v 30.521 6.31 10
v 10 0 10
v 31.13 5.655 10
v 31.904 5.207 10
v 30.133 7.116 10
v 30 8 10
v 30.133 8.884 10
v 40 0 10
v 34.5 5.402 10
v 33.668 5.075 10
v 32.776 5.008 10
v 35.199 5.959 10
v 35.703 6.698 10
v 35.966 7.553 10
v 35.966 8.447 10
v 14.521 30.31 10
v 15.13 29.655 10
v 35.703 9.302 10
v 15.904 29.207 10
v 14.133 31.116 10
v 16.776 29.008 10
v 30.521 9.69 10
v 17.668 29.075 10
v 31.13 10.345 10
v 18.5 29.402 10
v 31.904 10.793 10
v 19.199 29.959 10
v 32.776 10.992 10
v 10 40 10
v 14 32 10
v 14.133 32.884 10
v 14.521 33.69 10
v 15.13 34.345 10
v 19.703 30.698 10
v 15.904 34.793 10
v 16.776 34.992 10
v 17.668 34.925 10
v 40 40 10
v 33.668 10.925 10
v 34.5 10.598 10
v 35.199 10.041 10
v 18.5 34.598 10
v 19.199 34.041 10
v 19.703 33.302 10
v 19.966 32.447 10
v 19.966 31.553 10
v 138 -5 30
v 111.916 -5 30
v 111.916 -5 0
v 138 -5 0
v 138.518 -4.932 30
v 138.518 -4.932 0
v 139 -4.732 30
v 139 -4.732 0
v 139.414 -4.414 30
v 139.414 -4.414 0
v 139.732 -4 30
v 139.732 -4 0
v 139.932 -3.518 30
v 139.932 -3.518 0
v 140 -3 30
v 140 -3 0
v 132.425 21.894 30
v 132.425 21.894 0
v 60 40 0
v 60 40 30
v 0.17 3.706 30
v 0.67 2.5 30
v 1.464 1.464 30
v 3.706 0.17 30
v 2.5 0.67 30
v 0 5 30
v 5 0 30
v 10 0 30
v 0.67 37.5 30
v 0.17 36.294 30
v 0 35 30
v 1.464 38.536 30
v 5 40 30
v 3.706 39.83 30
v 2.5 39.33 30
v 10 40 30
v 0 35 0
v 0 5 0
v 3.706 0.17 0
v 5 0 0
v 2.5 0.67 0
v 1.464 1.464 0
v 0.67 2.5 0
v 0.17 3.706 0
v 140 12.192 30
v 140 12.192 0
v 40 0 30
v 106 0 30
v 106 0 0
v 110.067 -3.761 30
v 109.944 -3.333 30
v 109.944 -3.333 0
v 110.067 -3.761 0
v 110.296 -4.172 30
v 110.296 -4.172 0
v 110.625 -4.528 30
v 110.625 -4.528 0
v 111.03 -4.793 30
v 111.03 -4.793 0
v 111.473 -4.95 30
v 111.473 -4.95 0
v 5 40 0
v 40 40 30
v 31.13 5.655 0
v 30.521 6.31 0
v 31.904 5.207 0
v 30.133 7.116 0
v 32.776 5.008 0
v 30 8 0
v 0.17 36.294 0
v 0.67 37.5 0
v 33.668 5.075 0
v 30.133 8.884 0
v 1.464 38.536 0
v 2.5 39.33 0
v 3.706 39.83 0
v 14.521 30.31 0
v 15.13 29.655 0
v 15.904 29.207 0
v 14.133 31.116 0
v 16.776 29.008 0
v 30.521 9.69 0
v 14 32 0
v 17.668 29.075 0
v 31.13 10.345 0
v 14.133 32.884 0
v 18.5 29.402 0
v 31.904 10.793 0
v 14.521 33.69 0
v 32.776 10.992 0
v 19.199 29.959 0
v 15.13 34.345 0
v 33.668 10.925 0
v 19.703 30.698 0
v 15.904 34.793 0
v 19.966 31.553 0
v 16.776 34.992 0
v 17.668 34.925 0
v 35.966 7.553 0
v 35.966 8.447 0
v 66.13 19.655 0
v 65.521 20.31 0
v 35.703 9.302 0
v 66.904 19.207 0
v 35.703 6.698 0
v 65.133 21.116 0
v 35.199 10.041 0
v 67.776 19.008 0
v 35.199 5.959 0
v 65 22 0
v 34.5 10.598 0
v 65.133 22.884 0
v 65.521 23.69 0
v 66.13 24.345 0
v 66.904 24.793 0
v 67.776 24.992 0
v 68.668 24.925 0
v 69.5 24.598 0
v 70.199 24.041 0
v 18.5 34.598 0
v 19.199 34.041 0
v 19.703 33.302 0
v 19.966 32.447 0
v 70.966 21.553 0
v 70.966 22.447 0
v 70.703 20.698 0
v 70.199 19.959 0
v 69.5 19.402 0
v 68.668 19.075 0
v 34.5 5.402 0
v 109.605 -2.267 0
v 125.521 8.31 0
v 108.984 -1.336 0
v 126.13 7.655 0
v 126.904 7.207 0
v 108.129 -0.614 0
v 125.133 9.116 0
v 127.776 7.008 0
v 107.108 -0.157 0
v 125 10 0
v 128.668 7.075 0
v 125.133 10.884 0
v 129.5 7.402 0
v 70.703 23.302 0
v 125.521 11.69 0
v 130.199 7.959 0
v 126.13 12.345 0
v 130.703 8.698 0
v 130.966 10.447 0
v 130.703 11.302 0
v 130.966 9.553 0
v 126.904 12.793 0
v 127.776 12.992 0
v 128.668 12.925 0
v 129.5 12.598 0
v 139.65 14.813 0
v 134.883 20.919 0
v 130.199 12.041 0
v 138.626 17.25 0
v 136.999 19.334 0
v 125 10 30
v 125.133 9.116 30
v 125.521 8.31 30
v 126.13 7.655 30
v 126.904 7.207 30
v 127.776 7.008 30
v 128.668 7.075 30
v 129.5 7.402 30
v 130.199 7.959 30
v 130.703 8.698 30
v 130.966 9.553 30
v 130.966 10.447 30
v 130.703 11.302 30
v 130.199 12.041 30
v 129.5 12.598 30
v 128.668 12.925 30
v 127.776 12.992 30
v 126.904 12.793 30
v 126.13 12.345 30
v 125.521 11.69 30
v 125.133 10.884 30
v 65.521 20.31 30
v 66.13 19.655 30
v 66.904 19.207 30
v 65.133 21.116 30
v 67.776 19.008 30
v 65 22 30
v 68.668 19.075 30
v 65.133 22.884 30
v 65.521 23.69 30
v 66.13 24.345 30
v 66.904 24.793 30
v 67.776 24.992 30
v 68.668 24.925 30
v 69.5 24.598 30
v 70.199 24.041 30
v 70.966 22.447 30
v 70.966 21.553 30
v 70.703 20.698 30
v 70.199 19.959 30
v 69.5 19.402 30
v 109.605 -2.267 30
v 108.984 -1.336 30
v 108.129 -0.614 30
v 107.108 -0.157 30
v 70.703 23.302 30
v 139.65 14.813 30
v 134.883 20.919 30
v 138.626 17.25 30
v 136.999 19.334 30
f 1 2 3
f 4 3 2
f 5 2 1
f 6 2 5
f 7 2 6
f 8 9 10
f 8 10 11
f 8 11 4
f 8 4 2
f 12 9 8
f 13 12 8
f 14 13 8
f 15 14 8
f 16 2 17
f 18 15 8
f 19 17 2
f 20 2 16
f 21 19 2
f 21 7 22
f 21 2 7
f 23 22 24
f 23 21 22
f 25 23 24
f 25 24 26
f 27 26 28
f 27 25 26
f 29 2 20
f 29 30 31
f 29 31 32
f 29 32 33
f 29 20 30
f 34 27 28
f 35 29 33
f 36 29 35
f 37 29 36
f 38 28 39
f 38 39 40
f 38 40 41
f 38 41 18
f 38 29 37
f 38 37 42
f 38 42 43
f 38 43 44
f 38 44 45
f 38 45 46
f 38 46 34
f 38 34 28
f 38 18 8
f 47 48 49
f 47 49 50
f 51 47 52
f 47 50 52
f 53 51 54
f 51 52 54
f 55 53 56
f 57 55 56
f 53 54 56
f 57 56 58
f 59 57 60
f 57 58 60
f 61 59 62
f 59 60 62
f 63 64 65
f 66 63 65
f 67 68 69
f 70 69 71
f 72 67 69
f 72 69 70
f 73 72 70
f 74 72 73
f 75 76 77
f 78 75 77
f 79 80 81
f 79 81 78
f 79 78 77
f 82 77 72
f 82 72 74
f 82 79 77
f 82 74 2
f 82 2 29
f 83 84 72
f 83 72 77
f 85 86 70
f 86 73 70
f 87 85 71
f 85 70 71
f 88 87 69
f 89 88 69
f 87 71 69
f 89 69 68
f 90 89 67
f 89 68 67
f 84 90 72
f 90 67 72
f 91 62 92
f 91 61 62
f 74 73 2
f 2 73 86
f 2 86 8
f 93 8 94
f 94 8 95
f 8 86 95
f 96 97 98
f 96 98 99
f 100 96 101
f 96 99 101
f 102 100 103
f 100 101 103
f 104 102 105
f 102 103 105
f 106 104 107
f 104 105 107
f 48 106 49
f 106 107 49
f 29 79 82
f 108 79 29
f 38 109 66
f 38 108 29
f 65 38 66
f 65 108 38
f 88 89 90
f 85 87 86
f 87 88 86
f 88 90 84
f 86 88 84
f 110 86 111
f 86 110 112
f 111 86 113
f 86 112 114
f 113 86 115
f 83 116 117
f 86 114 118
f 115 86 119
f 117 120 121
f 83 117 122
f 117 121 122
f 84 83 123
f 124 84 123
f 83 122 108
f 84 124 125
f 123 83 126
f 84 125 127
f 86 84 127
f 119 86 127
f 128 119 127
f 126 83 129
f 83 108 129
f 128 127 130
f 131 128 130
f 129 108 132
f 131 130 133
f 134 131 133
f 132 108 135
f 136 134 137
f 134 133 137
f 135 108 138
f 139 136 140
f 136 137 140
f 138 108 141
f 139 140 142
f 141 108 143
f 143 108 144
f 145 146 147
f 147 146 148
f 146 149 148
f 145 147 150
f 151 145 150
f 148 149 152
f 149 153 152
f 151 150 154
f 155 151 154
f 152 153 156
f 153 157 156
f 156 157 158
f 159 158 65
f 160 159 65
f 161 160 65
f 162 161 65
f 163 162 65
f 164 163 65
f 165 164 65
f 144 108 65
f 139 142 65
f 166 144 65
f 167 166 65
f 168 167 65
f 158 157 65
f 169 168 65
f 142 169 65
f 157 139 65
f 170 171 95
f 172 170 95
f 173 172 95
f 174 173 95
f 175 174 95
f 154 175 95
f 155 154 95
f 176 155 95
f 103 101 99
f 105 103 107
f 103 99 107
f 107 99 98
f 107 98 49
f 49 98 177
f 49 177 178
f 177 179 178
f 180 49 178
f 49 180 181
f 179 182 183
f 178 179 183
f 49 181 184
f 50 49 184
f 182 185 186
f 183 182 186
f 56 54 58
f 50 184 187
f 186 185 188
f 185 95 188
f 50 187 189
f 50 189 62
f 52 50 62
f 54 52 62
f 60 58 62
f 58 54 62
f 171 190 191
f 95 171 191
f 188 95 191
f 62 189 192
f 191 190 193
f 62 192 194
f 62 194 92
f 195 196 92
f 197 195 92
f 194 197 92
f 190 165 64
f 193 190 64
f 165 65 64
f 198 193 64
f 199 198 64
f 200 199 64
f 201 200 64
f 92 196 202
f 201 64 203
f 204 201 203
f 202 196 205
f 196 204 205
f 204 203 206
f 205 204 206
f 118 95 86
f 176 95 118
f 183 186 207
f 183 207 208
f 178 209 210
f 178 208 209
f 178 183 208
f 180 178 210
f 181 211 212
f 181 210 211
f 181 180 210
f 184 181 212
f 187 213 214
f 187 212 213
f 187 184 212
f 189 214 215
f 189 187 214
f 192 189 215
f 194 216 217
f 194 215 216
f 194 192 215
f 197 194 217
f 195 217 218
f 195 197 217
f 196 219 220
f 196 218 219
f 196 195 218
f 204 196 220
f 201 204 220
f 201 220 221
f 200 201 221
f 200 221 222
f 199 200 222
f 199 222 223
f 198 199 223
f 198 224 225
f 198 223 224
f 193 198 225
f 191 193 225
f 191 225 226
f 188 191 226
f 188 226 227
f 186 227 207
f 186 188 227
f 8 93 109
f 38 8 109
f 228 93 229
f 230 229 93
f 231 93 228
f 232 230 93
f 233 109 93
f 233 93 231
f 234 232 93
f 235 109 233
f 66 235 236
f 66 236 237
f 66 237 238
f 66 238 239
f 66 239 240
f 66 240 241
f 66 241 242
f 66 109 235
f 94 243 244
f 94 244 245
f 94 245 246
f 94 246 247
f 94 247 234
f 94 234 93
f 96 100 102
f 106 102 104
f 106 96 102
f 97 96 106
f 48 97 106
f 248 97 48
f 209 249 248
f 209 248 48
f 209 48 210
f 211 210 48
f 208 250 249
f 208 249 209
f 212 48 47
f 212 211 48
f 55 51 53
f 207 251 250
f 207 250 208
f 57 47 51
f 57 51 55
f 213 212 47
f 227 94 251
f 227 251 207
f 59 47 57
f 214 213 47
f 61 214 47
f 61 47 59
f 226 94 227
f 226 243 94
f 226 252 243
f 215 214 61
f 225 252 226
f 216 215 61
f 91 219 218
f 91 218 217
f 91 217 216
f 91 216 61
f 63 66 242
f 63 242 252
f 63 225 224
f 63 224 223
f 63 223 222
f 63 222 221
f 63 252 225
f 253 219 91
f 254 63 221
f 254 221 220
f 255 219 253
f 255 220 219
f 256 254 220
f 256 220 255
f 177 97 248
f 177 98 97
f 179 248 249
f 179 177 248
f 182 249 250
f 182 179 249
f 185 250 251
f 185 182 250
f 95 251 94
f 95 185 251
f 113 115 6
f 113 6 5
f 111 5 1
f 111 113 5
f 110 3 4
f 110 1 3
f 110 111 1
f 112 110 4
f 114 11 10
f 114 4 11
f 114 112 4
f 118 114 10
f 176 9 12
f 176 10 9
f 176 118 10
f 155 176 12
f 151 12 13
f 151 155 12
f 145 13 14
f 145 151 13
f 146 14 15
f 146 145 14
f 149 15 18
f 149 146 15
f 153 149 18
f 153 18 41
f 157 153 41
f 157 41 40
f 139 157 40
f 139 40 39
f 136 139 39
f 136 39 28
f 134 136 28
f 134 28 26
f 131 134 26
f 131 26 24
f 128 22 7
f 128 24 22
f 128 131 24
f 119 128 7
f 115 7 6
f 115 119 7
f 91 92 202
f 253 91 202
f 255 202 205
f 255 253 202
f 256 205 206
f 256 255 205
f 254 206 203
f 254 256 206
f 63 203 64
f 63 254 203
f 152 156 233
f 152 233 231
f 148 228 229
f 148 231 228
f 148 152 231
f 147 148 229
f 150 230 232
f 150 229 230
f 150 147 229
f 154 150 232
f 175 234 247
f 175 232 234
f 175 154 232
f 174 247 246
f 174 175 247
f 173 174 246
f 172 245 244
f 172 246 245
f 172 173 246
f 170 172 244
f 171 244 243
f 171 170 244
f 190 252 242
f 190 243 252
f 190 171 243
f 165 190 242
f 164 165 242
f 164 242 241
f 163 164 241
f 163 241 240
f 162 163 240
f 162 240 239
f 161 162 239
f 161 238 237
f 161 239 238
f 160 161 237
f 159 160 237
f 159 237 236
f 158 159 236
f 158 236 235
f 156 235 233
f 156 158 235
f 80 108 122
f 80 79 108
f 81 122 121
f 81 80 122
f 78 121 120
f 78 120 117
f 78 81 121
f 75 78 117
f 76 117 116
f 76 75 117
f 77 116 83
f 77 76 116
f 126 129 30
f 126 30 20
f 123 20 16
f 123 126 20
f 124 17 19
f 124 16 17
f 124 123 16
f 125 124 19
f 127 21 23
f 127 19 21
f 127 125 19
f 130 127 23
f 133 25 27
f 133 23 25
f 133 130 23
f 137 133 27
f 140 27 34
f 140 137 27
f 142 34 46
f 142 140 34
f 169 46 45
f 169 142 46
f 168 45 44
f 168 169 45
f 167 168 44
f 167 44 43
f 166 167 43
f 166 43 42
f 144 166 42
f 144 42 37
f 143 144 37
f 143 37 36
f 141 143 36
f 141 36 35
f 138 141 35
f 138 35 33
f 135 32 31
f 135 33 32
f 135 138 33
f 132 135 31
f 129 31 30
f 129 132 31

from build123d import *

# Parameters (mm, degrees)
ESQUISSE1_W                  = 140
ESQUISSE1_H                  = 40
BOSS_EXTRU_1_DEPTH           = 30
ESQUISSE2_W                  = 30
ESQUISSE2_H                  = 40
ENL_V_MAT_EXTRU_1_DEPTH      = 20
ENL_V_MAT_EXTRU_2_DEPTH      = 149.660687473
ENL_V_MAT_EXTRU_2_DEPTH_BACK = 149.660687473
ENL_V_MAT_EXTRU_6_DEPTH      = 149.660687473
ENL_V_MAT_EXTRU_6_DEPTH_BACK = 149.660687473
ESQUISSE5_R                  = 3
CONG_1_R                     = 10
ESQUISSE6_W                  = 30
ESQUISSE6_H                  = 5
BOSS_EXTRU_2_DEPTH           = 30
CONG_2_R                     = 4
CONG_3_R                     = 2
CONG_4_R                     = 5


with BuildPart() as part:
    # Esquisse1 → Boss.-Extru.1 (new body)
    with BuildSketch(Plane.XY):
        with Locations((70, 20)):
            Rectangle(ESQUISSE1_W, ESQUISSE1_H)
    extrude(amount=BOSS_EXTRU_1_DEPTH)

    # Esquisse2 → Enlèv. mat.-Extru.1 (cut)
    with BuildSketch(Plane.XY.offset(30)):
        with Locations((25, 20)):
            Rectangle(ESQUISSE2_W, ESQUISSE2_H)
    extrude(amount=-ENL_V_MAT_EXTRU_1_DEPTH, mode=Mode.SUBTRACT)

    # Esquisse3 → Enlèv. mat.-Extru.2 (cut, two sides: drawn at the far end of the back side and taken through both)
    with BuildSketch(Plane.XY.offset(30).offset(-ENL_V_MAT_EXTRU_2_DEPTH_BACK)):
        Polygon((140, 20), (60, 40), (140, 40), align=None)
    extrude(amount=ENL_V_MAT_EXTRU_2_DEPTH + ENL_V_MAT_EXTRU_2_DEPTH_BACK, mode=Mode.SUBTRACT)

    # Esquisse5 → Enlèv. mat.-Extru.6 (cut, two sides: drawn at the far end of the back side and taken through both)
    with BuildSketch(Plane.XY.offset(30).offset(-ENL_V_MAT_EXTRU_6_DEPTH_BACK)):
        with Locations(Location((17, 32, 0), (0, 0, 180))):
            Circle(ESQUISSE5_R)
        with Locations(Location((33, 8, 0), (0, 0, 180))):
            Circle(ESQUISSE5_R)
        with Locations(Location((68, 22, 0), (0, 0, 180))):
            Circle(ESQUISSE5_R)
        with Locations(Location((128, 10, 0), (0, 0, 180))):
            Circle(ESQUISSE5_R)
    extrude(amount=ENL_V_MAT_EXTRU_6_DEPTH + ENL_V_MAT_EXTRU_6_DEPTH_BACK, mode=Mode.SUBTRACT)

    # Congé1
    cong_1_edges = [part.edges().sort_by_distance(p)[0] for p in [
        (140, 20, 15),
    ]]
    fillet(cong_1_edges, radius=CONG_1_R)

    # Esquisse6 → Boss.-Extru.2 (add)
    with BuildSketch(Plane.XY.offset(30)):
        with Locations((125, -2.5)):
            Rectangle(ESQUISSE6_W, ESQUISSE6_H)
    extrude(amount=-BOSS_EXTRU_2_DEPTH)

    # Congé2
    cong_2_edges = [part.edges().sort_by_distance(p)[0] for p in [
        (110, 0, 15),
    ]]
    fillet(cong_2_edges, radius=CONG_2_R)

    # Congé3
    cong_3_edges = [part.edges().sort_by_distance(p)[0] for p in [
        (140, -5, 15),
        (110, -5, 15),
    ]]
    fillet(cong_3_edges, radius=CONG_3_R)

    # Congé4
    cong_4_edges = [part.edges().sort_by_distance(p)[0] for p in [
        (0, 40, 15),
        (0, 0, 15),
    ]]
    fillet(cong_4_edges, radius=CONG_4_R)


solid = part.part
